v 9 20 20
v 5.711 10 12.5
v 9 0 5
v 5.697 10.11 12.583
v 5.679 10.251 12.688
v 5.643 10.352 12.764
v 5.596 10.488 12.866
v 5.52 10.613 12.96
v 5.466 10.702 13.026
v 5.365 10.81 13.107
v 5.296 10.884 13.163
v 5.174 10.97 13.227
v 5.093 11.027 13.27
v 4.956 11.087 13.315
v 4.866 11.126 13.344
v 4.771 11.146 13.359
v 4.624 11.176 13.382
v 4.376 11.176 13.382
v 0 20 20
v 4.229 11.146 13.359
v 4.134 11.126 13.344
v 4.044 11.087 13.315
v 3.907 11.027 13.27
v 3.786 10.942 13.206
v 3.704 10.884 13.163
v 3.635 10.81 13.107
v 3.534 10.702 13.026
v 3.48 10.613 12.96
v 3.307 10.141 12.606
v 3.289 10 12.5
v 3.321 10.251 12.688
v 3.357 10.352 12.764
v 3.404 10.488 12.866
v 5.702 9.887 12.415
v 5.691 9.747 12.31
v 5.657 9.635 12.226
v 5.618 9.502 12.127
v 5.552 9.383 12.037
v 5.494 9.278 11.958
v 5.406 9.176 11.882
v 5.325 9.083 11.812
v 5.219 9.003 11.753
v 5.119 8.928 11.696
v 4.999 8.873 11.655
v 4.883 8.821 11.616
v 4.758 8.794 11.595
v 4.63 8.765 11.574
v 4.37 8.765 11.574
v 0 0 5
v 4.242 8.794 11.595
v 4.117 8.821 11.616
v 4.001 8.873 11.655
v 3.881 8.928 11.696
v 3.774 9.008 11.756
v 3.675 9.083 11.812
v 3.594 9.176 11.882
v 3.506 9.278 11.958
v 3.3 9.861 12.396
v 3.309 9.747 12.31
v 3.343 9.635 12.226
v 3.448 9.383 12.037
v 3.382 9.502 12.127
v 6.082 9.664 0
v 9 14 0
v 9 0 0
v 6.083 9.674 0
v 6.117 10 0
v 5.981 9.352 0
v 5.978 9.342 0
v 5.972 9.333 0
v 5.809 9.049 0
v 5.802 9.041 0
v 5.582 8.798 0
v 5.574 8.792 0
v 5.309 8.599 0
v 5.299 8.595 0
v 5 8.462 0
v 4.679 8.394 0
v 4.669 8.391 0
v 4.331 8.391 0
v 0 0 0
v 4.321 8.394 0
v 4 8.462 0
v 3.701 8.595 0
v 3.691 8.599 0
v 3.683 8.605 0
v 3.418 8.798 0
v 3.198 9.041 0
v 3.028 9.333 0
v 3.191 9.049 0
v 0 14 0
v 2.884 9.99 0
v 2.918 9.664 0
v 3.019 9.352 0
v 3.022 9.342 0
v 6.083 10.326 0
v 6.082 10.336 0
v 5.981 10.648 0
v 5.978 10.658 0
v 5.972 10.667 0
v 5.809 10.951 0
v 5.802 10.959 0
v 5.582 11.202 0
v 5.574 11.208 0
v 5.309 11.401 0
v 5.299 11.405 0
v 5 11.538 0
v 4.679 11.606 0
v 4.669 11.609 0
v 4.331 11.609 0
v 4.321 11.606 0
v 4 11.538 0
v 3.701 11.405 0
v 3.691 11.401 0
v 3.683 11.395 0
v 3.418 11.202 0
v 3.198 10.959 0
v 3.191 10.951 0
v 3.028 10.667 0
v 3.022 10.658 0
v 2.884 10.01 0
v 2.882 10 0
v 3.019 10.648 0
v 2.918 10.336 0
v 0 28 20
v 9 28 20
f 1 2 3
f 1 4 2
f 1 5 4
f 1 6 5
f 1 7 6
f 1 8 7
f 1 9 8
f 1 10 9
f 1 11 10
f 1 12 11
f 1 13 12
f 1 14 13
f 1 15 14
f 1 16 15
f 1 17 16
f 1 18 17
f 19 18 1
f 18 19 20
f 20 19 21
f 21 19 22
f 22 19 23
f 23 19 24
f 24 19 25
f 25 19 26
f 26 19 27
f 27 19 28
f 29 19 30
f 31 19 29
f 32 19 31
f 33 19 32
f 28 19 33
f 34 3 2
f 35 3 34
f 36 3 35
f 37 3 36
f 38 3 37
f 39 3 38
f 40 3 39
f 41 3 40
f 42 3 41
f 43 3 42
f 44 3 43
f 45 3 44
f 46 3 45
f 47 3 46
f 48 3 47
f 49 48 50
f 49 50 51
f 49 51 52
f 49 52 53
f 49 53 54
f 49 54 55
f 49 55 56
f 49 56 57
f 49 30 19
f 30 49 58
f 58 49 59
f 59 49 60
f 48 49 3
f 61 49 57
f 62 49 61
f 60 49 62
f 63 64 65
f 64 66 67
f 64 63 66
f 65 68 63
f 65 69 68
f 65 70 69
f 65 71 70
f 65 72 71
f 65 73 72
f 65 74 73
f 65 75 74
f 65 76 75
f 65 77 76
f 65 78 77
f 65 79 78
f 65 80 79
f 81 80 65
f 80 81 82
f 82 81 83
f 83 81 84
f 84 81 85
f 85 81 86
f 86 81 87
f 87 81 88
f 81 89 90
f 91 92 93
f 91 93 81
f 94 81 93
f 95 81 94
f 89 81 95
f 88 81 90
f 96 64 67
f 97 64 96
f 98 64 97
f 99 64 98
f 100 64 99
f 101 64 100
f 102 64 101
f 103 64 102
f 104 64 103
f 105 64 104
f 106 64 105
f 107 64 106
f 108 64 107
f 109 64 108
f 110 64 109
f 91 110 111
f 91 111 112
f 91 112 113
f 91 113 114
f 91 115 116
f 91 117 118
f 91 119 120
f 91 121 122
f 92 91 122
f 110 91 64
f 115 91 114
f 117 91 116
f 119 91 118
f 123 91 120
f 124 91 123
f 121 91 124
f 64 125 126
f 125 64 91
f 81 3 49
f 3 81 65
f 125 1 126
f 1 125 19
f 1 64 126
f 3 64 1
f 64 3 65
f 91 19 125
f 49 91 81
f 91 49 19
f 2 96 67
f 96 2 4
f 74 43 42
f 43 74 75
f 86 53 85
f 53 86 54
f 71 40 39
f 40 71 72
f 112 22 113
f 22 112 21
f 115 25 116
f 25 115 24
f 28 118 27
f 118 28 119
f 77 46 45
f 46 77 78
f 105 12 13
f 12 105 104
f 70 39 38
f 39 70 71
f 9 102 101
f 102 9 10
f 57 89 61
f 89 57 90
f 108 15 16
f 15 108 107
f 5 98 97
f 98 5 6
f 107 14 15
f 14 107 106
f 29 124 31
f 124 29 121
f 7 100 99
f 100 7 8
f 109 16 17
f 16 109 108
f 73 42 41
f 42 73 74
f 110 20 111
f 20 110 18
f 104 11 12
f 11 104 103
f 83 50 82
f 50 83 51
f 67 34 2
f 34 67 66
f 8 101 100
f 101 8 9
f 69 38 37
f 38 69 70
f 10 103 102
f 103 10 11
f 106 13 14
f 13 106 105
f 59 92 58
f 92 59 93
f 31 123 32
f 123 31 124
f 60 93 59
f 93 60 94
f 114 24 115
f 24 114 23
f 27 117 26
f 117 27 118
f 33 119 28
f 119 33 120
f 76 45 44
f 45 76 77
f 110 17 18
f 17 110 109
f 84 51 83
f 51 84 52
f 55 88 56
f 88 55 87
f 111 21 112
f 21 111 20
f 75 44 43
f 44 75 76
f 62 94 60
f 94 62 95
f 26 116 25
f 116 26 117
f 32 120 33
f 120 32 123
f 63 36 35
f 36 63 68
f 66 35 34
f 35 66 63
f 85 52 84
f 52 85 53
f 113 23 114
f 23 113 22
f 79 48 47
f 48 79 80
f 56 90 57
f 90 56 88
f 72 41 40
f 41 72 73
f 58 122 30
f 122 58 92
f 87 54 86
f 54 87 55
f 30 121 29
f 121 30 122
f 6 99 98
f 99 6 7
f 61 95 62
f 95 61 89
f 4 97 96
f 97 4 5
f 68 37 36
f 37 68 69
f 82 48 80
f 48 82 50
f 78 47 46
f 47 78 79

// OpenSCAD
module ikeaLampFootLock(){
difference() {
	polyhedron(
		points = [
			[0, 0, 0], 		//0
			[9, 0, 0],		//1
			[9, 14, 0],		//2
			[0, 14, 0],		//3
			[0, 0, 5],		//4
			[9, 0, 5],		//5
			[0, 28, 20],		//6
			[9, 28, 20],		//7
			[0, 20, 20],		//8
			[9, 20, 20]		//9
		],
		faces = [
			[1, 2, 3, 0], // Bottom Face
			[8, 9, 5, 4], // Top Face Slanted
			[5, 9, 7, 2, 1], // Right Side Face
			[3, 6, 8, 4, 0], // Left side Face
			[7, 6, 3, 2], // Front Face
			[4, 5, 1, 0], // Back Face
			[8, 6, 7, 9]  // Top Face Flat
		]
	);

	translate([4.5, 10, -1]) {
		cylinder(20, 1.65, $fs=.05);
	}
}
}
ikeaLampFootLock();
